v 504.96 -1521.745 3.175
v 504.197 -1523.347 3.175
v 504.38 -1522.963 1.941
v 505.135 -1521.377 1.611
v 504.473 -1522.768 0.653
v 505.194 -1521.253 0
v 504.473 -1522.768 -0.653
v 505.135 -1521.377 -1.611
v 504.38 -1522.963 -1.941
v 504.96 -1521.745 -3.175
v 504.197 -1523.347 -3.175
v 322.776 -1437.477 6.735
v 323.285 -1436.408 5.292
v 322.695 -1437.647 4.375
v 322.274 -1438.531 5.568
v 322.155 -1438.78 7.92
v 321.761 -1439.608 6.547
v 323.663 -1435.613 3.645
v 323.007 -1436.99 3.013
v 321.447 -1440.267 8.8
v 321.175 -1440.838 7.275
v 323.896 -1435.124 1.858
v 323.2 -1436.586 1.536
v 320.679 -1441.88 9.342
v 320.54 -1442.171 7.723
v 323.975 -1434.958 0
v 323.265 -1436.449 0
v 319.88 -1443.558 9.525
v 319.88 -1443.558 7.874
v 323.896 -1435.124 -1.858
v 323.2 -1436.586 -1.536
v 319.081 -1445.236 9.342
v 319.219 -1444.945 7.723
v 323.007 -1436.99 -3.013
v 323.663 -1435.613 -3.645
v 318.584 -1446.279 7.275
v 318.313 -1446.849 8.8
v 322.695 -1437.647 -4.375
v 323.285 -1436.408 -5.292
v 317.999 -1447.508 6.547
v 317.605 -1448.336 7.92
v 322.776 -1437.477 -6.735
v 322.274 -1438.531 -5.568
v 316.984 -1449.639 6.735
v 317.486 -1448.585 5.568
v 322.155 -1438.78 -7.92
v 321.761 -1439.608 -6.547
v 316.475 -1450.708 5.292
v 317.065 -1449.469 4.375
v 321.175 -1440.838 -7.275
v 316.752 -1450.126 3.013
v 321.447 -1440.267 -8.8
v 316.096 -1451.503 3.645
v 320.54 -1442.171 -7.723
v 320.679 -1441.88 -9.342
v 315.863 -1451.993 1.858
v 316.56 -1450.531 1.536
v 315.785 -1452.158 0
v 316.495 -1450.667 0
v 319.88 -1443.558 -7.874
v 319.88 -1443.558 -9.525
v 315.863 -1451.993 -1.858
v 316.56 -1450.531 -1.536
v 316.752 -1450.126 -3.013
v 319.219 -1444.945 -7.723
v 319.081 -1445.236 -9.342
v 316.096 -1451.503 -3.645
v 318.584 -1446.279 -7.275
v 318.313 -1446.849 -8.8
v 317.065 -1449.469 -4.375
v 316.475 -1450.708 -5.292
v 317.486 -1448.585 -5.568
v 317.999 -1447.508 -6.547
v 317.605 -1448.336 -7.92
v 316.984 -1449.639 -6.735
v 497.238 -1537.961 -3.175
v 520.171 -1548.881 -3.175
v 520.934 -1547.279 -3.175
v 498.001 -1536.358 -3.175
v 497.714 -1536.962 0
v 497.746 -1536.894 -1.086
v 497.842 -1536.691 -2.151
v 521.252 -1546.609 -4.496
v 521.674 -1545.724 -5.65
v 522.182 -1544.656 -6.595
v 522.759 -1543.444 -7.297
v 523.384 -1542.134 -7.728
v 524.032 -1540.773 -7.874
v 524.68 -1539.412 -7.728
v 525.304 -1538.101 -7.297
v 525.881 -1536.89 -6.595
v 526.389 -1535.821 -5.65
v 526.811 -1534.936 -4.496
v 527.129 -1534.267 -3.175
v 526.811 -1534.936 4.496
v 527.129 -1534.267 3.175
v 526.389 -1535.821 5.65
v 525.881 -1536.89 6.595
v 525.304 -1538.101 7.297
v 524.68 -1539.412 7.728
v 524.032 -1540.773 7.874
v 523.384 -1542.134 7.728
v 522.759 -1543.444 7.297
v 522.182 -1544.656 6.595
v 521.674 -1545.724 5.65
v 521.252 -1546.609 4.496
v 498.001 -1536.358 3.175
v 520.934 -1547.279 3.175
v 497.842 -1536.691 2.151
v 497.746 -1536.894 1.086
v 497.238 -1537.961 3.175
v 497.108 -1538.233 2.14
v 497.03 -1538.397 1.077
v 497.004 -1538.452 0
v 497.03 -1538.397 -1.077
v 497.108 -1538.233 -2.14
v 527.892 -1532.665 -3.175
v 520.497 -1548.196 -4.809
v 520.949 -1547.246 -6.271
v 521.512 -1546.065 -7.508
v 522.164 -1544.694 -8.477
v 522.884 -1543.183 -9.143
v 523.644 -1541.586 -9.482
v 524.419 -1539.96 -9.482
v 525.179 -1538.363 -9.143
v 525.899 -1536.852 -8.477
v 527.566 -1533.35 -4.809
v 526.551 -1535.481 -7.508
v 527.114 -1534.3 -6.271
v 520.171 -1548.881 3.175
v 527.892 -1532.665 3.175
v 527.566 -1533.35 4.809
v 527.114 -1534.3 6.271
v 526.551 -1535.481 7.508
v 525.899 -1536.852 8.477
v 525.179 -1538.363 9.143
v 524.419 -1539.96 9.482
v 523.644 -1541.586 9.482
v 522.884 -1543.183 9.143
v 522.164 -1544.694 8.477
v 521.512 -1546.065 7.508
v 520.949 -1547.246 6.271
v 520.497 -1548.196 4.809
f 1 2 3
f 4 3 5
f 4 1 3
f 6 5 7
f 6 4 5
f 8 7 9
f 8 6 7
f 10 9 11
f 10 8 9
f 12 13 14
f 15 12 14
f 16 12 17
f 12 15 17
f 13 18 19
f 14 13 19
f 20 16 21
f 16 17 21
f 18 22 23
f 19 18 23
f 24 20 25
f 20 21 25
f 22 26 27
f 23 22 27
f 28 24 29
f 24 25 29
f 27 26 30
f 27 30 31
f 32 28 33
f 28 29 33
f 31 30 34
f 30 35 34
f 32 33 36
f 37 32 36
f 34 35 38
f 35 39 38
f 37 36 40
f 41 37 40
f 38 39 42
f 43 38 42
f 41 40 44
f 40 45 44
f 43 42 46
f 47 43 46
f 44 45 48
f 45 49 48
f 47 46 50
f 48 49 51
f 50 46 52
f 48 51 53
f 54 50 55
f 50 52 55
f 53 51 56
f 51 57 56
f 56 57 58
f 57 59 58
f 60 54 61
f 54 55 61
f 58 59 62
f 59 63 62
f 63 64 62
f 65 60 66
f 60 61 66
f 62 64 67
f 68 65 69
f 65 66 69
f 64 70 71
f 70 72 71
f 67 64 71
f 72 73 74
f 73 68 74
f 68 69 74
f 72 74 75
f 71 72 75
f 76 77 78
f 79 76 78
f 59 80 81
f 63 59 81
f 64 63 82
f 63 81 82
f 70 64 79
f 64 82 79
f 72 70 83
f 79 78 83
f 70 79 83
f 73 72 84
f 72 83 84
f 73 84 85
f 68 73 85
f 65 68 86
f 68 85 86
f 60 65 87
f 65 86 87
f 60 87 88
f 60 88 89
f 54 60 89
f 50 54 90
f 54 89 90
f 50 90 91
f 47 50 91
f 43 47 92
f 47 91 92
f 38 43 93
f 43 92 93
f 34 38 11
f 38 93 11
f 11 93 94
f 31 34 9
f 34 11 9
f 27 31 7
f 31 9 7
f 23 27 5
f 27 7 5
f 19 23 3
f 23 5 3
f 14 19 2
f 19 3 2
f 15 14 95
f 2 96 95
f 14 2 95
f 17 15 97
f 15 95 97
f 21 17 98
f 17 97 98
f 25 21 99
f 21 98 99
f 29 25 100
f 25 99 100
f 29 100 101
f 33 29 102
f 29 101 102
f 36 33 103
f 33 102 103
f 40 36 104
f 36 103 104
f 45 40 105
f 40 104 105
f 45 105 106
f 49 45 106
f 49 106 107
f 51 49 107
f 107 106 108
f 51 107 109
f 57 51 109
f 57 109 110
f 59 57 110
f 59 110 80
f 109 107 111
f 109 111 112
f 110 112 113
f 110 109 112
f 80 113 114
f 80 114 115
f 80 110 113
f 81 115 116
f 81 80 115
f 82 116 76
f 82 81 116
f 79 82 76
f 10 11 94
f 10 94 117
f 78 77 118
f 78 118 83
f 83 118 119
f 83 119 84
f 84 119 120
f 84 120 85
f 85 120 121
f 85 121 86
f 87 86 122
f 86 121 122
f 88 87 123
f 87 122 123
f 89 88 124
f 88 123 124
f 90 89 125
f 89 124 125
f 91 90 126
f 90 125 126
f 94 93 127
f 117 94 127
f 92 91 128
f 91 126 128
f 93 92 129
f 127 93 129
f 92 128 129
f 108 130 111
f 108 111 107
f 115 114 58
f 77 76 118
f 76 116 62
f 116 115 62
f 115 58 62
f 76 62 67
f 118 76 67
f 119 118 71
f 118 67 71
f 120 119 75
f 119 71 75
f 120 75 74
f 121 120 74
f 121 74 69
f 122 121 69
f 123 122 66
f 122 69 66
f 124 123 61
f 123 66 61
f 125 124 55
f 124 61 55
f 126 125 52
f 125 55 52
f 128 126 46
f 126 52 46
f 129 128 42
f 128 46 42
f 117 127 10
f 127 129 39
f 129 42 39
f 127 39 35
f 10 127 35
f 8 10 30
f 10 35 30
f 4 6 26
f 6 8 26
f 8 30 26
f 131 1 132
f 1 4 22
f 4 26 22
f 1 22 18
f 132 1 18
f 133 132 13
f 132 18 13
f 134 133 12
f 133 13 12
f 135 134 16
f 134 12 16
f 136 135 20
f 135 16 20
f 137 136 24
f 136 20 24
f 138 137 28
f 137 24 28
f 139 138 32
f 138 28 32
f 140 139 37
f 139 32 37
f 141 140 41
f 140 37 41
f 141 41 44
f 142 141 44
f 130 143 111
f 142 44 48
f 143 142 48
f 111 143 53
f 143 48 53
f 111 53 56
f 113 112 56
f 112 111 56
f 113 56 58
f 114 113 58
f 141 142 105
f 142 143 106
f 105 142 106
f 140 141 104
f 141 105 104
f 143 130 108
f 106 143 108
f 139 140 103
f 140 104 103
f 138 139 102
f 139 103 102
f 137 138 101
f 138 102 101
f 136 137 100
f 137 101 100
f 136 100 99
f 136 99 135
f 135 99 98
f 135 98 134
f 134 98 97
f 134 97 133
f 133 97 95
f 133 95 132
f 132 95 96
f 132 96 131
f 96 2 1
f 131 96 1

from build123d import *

# Parameters (mm, degrees)
CUT_EXTRUDE1_START = -25.4
SKETCH2_W          = 6.35
SKETCH2_H          = 19.05
CUT_EXTRUDE1_DEPTH = 25.4


with BuildPart() as part:
    # Sketch1 → Revolve1 (revolve)
    with BuildSketch(Plane.XY):
        Polygon((520.646295907, -1547.882062127), (519.936476988, -1549.372685521), (315.784745775, -1452.157814294), (316.494564694, -1450.6671909), align=None)
    revolve(axis=Axis((319.879854926, -1443.558063946, 0), (0.902860929, -0.429932719, 0)))

    # Sketch2 → Cut-Extrude1 (cut)
    with BuildSketch(Plane(origin=(1025.2494541, -488.212826138, 0), x_dir=(0, 0, -1), z_dir=(0.902860929, -0.429932719, 0)).offset(CUT_EXTRUDE1_START)):
        with Locations((0, -1165.805358667)):
            Rectangle(SKETCH2_W, SKETCH2_H)
    extrude(amount=CUT_EXTRUDE1_DEPTH, mode=Mode.SUBTRACT)


solid = part.part
